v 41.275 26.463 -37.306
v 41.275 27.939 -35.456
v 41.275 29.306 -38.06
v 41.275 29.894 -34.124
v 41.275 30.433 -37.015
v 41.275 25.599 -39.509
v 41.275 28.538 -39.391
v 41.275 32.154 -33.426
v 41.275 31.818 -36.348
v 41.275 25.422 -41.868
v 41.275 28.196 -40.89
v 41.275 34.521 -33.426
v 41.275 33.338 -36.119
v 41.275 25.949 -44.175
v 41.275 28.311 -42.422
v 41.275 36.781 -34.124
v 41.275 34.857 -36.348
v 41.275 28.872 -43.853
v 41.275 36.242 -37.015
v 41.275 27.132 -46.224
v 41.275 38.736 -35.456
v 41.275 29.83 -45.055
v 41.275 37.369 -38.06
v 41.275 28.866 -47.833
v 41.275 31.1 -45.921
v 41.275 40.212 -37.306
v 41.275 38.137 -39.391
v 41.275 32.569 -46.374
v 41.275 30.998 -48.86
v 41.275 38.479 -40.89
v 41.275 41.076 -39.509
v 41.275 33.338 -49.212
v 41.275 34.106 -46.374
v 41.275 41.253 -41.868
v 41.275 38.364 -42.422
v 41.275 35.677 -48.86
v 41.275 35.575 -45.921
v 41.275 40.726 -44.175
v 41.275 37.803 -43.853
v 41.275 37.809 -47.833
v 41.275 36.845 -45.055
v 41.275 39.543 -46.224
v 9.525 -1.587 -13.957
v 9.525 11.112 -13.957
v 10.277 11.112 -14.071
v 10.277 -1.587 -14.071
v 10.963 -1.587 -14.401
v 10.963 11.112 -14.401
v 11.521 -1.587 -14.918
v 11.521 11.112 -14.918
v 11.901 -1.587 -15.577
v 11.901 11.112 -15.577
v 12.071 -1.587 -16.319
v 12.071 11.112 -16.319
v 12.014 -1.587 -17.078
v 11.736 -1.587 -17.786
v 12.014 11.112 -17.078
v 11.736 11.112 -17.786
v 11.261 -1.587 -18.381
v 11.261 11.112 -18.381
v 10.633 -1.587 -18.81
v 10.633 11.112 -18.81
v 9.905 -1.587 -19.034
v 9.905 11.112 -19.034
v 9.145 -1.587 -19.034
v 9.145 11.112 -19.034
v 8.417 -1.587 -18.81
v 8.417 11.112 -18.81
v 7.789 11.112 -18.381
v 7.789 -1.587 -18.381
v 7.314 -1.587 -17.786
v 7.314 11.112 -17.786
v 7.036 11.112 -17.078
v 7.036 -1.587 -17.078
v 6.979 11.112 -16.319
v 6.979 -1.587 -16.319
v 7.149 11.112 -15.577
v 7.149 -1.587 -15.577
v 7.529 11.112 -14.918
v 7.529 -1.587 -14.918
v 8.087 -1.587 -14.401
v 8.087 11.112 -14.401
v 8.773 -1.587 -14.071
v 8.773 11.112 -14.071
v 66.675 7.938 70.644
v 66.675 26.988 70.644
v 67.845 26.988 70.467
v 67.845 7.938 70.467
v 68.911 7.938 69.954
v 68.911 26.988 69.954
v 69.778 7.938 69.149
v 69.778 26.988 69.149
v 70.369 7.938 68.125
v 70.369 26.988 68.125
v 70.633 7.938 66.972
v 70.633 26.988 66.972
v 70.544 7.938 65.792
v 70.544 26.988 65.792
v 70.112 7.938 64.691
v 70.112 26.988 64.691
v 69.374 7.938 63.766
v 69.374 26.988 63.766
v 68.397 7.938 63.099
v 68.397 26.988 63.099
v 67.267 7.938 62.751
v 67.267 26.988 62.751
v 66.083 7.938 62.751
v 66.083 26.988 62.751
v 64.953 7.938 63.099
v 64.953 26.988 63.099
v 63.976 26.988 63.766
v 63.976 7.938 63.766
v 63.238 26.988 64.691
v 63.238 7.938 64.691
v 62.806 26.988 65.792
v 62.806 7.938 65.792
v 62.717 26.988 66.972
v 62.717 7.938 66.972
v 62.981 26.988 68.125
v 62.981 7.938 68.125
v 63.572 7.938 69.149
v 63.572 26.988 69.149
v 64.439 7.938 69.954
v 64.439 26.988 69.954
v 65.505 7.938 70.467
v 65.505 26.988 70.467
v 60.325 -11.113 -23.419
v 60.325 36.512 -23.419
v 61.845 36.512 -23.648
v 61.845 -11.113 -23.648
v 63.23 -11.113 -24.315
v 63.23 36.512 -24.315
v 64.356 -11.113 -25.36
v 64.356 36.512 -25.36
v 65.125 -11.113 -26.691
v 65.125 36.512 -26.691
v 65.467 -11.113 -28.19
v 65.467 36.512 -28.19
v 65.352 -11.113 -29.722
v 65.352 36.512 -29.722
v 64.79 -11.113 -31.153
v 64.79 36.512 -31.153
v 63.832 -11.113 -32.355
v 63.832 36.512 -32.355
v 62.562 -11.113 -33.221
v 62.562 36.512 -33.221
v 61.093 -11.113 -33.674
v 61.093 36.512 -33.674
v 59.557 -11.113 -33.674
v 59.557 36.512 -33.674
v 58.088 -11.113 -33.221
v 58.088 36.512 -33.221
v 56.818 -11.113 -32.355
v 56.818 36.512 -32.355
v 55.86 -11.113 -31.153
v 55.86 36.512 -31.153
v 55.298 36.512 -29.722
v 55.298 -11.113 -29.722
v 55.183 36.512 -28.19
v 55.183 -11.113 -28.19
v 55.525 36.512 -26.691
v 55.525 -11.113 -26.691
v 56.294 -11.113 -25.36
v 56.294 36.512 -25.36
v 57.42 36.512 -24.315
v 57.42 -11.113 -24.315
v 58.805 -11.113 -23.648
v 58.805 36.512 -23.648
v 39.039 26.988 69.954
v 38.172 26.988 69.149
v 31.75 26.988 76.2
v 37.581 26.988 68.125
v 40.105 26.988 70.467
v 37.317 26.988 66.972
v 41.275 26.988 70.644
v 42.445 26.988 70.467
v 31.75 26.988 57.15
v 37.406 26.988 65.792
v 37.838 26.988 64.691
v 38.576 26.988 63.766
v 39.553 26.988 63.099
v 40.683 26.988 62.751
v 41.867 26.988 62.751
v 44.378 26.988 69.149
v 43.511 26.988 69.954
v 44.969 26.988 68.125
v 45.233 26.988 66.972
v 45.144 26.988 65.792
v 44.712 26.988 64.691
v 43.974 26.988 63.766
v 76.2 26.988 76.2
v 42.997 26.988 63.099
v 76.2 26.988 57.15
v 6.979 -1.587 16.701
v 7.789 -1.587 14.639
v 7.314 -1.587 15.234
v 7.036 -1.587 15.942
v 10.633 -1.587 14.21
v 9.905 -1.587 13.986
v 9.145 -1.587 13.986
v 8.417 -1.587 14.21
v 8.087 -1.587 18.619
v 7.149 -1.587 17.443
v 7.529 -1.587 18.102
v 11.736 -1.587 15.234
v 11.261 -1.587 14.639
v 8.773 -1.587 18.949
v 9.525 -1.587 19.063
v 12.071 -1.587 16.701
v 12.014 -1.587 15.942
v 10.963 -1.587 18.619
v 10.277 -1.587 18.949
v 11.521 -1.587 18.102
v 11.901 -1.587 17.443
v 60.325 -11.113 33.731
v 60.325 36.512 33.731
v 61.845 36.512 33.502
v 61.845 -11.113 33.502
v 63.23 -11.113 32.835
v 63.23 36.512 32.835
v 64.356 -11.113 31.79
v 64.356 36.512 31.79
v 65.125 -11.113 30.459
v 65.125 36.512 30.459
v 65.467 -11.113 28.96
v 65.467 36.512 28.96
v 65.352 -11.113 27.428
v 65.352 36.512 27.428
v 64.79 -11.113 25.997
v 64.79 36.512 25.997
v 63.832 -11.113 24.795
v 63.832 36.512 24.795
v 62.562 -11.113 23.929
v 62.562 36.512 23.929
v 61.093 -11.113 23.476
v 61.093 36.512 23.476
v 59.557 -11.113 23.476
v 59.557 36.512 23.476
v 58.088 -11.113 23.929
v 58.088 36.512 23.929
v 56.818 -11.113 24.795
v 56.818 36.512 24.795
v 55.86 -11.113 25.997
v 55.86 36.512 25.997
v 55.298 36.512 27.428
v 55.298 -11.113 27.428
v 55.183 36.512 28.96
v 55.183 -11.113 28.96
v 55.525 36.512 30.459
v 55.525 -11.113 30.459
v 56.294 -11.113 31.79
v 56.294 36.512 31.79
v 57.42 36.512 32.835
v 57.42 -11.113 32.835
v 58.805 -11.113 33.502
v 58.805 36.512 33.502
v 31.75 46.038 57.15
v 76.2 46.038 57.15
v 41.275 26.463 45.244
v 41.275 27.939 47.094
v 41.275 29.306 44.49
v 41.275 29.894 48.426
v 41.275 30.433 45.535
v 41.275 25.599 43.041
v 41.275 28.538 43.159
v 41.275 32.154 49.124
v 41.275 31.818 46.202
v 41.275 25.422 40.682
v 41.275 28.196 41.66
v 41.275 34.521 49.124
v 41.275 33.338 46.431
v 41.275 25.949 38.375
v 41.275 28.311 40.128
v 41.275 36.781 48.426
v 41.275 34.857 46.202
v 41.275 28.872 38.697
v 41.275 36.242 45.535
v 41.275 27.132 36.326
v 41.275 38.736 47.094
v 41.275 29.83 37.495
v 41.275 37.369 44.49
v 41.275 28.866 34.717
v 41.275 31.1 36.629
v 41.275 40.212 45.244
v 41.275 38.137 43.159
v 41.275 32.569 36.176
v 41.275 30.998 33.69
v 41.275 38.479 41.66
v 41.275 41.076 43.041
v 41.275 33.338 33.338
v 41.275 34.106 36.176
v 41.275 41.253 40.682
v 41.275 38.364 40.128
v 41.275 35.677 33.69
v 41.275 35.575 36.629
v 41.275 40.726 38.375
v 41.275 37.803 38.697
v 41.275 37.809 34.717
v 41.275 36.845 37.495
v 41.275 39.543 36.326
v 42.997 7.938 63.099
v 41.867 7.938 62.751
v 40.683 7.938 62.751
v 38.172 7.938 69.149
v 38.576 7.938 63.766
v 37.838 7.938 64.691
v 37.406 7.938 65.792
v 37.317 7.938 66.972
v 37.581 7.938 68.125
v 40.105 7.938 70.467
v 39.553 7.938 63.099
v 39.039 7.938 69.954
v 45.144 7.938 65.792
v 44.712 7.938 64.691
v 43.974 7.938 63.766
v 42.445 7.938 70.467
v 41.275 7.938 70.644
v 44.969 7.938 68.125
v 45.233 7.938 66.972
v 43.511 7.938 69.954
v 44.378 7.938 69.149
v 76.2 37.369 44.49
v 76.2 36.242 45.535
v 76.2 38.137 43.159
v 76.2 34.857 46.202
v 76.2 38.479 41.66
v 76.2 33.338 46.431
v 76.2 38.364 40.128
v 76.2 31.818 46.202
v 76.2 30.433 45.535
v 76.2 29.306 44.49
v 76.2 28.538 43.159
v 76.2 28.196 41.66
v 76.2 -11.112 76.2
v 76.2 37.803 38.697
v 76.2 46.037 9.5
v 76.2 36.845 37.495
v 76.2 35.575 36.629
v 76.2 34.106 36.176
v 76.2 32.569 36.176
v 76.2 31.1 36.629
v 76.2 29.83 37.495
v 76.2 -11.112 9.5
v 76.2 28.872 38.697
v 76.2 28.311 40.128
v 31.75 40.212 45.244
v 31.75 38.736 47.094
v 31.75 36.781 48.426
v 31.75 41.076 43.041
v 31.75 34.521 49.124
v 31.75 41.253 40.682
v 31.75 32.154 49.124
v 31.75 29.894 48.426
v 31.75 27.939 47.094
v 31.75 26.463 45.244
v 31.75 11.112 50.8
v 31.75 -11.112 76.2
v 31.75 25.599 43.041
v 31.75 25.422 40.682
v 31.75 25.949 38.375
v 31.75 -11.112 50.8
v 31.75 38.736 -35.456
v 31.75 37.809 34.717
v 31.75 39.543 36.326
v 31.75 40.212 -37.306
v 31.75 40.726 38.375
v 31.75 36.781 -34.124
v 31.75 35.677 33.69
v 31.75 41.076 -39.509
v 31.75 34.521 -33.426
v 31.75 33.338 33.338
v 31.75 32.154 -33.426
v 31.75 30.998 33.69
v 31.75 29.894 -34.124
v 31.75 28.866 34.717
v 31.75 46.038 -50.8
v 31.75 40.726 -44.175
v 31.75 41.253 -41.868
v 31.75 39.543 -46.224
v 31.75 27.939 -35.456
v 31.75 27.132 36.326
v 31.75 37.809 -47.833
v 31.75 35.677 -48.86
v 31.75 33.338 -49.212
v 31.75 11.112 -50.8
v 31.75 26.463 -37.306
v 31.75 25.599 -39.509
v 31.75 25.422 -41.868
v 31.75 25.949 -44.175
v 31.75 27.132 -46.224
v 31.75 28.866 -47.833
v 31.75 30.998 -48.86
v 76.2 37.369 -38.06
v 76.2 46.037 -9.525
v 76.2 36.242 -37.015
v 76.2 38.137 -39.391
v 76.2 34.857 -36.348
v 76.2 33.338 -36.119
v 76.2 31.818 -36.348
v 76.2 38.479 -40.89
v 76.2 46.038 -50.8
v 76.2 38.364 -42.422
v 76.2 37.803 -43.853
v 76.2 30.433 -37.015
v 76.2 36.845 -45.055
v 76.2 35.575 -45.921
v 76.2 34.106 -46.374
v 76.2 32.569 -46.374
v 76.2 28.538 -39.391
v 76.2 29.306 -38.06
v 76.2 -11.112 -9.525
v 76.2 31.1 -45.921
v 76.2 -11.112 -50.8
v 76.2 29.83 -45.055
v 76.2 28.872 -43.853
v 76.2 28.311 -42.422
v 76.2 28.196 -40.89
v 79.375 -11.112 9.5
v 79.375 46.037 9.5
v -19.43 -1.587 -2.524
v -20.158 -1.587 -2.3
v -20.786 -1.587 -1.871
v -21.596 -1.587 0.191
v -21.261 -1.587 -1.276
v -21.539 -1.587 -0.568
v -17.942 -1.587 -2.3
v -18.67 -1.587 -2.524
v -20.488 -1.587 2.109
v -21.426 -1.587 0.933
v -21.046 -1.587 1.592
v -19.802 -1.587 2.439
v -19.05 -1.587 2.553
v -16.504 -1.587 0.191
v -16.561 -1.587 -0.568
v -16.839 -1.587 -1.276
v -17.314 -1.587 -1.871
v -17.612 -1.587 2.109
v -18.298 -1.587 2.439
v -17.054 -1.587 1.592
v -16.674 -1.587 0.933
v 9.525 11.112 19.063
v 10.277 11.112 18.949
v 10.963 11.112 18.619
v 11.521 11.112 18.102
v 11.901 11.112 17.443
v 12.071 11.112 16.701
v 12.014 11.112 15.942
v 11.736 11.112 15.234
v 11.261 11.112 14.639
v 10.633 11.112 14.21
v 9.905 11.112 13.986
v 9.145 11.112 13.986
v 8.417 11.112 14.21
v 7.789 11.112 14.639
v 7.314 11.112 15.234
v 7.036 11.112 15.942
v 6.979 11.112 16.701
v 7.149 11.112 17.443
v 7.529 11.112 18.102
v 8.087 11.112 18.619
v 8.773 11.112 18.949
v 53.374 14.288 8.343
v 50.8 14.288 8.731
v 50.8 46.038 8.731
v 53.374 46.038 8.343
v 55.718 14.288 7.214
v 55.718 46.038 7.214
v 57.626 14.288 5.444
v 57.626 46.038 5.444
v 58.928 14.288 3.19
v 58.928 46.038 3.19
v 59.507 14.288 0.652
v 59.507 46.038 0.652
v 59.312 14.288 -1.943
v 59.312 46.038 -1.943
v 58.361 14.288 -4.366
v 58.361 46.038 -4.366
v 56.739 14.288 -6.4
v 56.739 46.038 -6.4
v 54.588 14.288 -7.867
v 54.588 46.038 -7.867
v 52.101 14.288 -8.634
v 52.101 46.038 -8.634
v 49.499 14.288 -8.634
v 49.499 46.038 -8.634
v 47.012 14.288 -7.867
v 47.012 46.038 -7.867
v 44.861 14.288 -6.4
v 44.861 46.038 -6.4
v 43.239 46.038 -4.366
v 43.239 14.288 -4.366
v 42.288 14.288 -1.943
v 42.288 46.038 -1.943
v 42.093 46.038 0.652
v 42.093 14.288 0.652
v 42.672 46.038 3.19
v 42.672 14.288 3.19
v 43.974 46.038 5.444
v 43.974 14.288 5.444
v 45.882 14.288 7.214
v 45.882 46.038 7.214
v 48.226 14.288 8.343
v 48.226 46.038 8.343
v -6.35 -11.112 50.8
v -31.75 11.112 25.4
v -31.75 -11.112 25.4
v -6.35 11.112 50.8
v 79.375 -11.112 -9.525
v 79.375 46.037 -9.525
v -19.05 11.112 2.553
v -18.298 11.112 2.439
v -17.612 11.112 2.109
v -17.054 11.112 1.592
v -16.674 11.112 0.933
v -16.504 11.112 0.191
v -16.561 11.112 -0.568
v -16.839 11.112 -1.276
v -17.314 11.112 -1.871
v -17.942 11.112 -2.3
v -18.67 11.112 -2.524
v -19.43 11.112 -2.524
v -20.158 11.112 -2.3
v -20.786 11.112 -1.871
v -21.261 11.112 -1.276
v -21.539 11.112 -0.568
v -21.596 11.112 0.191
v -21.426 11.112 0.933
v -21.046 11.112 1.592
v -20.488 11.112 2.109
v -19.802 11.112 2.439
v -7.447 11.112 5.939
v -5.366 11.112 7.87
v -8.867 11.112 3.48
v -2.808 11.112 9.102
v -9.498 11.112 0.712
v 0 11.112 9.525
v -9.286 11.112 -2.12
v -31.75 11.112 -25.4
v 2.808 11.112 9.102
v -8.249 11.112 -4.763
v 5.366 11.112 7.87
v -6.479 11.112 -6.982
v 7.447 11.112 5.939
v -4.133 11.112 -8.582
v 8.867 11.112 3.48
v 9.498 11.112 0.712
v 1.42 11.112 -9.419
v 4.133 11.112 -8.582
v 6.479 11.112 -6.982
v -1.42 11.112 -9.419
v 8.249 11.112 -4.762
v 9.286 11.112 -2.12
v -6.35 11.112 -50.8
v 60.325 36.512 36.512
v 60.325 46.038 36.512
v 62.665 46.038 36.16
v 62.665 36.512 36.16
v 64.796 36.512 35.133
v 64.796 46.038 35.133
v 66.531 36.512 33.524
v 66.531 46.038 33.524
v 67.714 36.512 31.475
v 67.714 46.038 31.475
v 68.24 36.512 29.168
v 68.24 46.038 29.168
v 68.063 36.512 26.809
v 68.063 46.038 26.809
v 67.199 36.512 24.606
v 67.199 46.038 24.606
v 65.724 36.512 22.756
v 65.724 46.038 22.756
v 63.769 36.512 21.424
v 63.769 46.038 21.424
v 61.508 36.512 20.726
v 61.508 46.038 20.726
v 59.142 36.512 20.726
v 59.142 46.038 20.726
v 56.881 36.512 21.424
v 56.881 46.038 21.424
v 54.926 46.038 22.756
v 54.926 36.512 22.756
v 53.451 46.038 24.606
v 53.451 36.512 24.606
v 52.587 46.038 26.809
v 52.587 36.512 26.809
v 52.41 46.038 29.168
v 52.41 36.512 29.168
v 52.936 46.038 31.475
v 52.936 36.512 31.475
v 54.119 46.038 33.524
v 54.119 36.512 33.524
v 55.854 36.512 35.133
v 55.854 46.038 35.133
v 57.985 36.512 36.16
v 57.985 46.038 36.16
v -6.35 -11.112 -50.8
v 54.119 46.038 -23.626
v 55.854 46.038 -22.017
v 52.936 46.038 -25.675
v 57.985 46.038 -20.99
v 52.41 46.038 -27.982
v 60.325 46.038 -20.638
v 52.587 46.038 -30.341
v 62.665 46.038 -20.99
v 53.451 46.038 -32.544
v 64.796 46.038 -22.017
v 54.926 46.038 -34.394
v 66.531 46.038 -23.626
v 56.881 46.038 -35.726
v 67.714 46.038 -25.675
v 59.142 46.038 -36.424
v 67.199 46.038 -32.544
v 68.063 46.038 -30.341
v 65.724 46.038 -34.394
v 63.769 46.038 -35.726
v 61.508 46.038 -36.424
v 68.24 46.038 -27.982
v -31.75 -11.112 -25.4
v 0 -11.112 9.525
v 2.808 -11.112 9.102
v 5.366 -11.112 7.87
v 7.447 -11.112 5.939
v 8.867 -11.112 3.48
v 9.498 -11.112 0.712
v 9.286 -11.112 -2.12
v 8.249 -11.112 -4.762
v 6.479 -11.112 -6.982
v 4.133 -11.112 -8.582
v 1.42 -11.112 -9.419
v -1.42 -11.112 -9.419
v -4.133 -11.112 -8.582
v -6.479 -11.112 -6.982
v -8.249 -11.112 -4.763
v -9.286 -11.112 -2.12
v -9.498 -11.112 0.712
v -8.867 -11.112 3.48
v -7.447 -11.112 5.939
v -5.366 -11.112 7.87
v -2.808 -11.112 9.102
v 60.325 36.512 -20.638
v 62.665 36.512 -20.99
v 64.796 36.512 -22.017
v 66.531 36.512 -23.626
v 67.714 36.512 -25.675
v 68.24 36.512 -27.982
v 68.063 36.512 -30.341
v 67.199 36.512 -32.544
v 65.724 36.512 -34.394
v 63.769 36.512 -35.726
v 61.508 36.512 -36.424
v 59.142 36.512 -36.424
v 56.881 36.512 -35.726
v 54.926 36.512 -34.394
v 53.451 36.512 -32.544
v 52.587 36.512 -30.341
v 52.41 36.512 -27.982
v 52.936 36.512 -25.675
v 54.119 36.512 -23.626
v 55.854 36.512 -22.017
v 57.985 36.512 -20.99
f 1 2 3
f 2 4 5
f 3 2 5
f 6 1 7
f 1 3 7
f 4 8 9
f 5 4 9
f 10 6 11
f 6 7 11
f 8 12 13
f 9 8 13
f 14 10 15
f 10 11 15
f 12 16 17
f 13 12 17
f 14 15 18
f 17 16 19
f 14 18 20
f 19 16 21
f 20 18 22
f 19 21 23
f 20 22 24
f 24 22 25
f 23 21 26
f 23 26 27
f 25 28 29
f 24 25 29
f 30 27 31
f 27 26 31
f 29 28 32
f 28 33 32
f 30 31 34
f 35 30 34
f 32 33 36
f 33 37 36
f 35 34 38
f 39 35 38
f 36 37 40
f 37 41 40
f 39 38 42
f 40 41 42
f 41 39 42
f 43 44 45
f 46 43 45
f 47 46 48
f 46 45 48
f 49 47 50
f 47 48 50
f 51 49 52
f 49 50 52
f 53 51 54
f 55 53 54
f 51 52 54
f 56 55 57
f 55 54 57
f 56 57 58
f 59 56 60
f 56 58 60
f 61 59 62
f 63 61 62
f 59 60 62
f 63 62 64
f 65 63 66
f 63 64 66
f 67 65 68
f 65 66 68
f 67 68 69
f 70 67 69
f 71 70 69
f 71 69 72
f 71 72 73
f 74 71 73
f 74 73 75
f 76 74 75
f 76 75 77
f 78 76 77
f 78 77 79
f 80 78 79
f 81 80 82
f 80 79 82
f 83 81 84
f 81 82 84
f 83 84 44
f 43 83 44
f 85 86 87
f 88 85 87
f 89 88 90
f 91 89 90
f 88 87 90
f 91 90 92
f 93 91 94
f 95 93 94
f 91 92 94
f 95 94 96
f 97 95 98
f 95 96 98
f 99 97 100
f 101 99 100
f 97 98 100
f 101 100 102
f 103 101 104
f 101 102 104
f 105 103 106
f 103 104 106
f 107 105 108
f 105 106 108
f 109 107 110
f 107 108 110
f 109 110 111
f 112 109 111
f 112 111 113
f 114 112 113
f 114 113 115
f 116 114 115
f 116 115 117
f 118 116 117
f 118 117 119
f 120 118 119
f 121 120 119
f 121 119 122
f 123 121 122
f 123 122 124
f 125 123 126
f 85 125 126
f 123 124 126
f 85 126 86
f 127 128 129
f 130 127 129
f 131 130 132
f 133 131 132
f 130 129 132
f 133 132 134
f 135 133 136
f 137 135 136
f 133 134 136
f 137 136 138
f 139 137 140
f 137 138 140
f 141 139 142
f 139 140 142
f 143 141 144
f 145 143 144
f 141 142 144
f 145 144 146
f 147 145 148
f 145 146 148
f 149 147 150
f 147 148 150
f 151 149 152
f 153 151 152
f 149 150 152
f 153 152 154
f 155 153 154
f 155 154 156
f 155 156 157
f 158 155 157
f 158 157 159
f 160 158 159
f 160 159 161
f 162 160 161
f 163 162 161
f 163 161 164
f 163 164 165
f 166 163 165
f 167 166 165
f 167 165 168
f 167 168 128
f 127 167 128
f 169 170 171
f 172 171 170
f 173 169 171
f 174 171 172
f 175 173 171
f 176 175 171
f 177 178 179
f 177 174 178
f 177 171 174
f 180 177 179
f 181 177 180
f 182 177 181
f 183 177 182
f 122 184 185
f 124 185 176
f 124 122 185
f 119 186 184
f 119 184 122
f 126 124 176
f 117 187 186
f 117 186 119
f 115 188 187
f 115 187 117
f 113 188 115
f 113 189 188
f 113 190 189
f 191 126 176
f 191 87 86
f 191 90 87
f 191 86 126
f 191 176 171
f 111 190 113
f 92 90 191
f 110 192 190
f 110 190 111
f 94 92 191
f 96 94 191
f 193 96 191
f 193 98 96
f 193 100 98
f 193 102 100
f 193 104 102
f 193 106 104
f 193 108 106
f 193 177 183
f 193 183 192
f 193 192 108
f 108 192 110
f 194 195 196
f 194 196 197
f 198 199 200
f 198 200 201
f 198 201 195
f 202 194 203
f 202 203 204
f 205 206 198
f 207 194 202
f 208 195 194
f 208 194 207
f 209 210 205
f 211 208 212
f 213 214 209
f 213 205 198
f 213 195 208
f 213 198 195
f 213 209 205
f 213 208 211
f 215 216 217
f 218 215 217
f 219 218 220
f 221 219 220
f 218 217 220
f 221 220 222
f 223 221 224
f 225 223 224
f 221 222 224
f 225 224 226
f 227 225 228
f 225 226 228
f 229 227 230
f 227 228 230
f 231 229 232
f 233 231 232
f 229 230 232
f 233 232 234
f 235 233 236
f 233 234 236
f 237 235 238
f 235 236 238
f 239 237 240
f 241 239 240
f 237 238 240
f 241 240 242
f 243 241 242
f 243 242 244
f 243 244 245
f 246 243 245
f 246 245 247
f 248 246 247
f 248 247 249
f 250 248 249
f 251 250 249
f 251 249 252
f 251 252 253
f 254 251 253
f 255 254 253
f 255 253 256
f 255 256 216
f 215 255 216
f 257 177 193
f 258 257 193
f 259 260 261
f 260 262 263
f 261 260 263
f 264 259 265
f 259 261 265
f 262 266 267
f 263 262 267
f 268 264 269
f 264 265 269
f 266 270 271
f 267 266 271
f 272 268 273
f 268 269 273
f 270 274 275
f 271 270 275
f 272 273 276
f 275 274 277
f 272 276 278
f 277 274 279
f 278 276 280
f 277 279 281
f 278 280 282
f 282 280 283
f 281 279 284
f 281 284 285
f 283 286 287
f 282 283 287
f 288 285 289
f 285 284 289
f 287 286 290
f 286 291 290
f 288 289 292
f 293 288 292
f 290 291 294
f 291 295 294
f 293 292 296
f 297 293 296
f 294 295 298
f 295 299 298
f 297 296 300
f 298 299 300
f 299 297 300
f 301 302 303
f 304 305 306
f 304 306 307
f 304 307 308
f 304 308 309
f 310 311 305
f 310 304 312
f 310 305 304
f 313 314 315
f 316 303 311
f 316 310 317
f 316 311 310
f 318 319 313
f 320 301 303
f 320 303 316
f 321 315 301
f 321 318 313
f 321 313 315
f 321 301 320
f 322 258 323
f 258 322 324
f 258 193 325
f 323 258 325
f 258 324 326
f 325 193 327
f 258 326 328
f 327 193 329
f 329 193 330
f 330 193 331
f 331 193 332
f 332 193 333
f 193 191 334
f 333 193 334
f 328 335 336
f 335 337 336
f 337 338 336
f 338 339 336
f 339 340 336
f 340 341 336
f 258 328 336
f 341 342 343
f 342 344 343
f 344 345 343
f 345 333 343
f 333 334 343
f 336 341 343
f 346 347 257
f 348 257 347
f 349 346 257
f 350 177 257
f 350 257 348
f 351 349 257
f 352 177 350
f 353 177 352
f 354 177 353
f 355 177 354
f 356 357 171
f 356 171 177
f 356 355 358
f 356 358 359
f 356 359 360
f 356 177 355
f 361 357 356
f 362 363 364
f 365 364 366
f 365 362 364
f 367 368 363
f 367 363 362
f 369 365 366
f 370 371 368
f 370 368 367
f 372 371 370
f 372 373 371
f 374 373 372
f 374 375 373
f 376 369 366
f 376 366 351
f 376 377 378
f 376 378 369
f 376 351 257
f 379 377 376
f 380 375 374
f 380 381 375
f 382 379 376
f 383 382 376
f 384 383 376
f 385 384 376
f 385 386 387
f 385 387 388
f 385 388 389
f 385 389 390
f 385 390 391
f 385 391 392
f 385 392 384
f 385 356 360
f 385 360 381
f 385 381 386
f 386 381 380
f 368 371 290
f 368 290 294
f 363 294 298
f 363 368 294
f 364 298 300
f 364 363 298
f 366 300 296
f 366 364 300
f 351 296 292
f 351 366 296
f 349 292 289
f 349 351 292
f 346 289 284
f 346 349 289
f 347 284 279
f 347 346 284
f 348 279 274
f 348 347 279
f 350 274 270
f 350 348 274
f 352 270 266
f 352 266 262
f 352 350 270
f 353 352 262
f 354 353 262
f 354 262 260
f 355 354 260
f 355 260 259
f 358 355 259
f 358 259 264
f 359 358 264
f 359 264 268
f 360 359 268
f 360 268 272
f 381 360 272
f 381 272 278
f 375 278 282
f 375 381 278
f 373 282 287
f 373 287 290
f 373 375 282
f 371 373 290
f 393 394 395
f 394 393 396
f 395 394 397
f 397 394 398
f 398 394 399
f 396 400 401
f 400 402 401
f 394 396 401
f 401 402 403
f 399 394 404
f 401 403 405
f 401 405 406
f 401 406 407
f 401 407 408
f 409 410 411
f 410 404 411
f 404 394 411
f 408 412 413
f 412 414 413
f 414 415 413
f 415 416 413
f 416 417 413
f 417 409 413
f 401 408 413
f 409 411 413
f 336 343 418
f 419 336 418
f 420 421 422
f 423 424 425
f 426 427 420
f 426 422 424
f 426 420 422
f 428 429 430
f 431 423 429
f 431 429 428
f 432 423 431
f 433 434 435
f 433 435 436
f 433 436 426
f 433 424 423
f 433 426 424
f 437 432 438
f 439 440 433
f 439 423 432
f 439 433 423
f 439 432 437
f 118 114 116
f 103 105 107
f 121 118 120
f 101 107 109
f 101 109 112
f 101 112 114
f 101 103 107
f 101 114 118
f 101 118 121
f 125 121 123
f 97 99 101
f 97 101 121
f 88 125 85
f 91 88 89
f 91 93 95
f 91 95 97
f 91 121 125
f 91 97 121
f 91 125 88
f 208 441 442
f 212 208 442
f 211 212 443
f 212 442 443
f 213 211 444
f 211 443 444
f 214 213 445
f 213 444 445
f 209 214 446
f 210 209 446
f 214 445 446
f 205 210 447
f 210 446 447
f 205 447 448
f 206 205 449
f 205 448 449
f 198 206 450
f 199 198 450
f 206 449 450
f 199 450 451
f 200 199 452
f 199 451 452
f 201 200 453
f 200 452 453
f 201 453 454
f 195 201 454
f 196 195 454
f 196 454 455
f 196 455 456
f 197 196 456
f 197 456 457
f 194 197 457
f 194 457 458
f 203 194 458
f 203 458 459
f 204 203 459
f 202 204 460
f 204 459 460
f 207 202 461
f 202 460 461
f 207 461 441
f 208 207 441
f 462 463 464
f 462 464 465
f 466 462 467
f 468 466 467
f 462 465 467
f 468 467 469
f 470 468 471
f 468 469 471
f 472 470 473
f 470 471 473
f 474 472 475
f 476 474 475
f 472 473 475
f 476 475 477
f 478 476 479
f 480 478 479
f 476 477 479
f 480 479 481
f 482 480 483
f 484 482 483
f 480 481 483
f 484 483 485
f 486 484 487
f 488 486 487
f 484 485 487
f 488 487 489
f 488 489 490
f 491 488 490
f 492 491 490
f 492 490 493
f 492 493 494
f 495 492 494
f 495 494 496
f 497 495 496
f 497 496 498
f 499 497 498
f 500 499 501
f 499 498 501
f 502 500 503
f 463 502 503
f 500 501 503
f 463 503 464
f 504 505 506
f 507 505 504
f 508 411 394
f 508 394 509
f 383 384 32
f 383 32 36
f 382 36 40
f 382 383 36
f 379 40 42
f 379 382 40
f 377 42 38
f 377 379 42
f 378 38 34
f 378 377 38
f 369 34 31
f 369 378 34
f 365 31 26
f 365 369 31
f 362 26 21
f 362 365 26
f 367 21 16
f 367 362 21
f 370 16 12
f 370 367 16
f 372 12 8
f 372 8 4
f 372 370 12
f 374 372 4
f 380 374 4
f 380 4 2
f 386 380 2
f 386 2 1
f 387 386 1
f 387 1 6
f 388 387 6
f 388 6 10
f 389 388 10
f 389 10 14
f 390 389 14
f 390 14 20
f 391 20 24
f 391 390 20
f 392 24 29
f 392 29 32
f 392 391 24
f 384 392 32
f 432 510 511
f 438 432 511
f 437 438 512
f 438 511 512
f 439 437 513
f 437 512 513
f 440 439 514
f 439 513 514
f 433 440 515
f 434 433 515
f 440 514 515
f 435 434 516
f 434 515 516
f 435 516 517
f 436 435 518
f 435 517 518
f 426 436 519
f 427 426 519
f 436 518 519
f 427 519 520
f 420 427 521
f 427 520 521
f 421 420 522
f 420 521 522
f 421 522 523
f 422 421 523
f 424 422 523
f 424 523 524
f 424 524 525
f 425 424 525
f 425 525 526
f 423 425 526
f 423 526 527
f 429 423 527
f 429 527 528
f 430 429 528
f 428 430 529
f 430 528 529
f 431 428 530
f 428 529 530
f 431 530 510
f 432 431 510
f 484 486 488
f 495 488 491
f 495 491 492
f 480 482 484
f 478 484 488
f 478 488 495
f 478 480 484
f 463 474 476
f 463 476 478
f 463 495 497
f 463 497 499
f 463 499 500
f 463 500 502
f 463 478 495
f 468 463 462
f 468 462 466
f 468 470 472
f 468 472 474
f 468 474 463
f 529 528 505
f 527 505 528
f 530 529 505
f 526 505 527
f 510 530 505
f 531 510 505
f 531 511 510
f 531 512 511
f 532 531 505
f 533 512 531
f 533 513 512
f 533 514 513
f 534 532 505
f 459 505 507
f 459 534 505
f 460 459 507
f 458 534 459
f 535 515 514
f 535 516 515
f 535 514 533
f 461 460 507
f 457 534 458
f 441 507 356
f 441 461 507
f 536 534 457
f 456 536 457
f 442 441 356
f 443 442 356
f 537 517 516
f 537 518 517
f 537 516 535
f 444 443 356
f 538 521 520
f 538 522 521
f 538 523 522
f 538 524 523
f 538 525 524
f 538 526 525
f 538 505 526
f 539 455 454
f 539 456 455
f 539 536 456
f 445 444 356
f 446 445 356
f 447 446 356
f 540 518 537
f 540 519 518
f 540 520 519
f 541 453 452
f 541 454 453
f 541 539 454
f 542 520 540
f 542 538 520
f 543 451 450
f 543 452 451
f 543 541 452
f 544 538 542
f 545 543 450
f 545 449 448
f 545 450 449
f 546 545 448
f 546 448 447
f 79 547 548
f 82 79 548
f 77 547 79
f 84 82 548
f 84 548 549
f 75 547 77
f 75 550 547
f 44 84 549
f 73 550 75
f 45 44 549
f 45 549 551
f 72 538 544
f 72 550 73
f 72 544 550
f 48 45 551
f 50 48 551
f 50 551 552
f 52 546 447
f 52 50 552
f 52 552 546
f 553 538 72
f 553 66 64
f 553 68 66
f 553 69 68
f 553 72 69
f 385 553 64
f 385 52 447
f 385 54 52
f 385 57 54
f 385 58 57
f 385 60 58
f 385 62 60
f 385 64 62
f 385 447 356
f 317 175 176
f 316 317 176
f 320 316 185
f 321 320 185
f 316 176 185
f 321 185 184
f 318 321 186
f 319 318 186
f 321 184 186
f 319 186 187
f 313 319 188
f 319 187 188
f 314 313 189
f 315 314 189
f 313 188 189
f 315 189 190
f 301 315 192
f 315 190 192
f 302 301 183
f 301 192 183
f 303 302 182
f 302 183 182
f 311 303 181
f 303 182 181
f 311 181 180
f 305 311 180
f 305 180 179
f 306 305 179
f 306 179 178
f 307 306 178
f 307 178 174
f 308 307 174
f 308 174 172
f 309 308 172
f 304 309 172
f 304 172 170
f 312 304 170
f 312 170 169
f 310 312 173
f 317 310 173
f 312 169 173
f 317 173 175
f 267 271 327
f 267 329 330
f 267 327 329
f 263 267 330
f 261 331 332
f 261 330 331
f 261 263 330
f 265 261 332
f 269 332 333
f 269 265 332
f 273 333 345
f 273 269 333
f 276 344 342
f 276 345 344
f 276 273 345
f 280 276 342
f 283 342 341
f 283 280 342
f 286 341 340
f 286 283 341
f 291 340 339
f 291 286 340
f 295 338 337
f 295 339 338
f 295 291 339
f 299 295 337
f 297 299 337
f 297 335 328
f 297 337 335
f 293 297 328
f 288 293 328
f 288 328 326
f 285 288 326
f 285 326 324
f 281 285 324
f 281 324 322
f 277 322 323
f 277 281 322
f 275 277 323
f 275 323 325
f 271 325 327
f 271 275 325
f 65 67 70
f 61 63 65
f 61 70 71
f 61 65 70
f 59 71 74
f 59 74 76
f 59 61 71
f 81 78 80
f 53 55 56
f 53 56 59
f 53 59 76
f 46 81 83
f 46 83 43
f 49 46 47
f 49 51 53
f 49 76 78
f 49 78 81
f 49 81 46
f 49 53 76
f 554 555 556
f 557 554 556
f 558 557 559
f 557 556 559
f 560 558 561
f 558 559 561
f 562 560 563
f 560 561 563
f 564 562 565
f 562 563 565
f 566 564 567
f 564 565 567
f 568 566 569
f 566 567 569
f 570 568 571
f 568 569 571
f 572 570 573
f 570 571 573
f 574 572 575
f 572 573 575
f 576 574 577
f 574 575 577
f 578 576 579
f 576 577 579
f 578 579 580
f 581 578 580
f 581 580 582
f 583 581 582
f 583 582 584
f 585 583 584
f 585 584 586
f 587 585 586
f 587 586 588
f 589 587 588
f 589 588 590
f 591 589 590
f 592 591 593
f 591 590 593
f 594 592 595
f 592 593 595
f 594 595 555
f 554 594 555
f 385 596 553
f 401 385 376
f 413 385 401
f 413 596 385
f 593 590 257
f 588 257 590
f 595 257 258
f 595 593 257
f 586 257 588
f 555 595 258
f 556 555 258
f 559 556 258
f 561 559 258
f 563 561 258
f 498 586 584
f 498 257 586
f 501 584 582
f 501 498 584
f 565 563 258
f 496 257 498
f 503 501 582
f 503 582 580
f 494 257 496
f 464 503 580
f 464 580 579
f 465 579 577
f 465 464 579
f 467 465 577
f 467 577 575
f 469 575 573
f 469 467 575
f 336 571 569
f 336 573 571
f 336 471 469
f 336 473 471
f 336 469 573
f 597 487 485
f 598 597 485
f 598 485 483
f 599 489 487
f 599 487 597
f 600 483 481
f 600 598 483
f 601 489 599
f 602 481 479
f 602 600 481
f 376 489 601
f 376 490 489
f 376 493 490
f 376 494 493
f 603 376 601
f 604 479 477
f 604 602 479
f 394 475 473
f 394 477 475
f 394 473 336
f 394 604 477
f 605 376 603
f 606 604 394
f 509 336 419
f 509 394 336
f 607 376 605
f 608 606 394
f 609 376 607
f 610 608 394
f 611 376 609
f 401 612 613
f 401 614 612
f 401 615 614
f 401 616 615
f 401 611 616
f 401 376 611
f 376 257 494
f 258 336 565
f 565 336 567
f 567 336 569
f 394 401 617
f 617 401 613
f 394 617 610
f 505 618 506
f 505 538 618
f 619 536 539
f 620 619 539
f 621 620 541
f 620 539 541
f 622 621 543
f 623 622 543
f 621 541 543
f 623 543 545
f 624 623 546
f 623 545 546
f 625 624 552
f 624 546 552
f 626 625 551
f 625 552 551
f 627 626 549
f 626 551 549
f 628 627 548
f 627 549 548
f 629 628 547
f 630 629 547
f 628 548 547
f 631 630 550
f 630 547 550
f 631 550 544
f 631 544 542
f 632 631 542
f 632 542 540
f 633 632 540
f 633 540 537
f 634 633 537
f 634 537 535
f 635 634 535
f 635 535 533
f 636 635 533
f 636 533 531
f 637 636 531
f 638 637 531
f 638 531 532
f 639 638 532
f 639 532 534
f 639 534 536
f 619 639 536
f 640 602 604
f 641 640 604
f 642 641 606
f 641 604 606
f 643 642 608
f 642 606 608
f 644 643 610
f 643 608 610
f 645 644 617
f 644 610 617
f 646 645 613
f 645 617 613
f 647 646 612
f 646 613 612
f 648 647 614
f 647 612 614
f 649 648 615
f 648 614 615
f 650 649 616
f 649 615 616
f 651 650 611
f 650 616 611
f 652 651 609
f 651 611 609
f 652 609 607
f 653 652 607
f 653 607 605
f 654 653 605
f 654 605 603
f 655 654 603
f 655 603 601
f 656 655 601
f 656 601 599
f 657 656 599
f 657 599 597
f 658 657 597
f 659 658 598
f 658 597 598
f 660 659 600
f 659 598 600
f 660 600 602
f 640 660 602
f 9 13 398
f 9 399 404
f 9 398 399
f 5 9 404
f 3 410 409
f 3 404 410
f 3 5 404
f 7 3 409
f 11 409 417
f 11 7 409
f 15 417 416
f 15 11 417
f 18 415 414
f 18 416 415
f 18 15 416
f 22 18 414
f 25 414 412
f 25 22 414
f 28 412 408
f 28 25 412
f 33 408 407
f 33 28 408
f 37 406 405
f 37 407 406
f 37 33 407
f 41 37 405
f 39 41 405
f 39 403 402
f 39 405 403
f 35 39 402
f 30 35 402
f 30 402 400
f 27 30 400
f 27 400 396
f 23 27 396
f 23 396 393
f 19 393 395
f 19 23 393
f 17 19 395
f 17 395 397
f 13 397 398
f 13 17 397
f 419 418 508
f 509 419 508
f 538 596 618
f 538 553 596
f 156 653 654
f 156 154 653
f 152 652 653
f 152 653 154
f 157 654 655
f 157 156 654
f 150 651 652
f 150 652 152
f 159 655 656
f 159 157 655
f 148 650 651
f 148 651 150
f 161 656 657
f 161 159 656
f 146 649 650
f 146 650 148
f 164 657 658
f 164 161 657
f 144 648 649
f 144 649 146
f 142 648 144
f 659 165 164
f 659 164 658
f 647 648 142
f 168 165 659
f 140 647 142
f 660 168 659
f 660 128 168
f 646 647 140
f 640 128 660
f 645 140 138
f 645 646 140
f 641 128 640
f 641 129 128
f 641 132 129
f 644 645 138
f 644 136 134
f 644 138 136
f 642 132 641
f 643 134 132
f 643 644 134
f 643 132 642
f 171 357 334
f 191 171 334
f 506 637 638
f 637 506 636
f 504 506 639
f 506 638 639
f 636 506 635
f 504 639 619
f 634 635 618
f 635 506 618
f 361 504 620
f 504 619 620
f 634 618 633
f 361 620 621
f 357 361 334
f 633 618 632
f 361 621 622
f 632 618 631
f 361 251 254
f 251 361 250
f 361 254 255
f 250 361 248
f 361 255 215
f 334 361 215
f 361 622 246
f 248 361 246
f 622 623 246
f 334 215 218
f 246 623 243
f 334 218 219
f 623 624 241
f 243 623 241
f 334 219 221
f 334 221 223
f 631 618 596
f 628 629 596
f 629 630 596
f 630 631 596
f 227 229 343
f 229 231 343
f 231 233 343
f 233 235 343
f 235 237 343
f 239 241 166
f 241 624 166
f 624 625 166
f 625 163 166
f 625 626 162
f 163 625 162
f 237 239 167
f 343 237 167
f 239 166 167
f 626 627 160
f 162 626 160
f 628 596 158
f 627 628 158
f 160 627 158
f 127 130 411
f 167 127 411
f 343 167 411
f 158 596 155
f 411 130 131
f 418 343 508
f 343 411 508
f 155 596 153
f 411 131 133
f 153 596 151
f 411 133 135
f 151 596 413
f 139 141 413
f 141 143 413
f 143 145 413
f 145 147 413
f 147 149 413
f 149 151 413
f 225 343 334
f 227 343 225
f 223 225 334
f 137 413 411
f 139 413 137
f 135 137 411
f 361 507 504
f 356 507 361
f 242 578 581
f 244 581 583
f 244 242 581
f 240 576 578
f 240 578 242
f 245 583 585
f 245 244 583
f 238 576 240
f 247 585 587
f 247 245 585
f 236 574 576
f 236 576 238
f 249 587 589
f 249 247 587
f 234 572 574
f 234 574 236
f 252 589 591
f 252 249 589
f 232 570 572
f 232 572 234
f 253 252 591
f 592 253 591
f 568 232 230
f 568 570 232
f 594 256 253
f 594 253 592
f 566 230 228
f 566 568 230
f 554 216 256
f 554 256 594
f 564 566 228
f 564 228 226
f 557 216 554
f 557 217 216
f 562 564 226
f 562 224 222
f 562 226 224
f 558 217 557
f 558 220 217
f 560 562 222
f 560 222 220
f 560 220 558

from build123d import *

# Parameters (mm, degrees)
BOSS_EXTRUDE1_DEPTH = 11.1125
BOSS_EXTRUDE2_START = -11.1125
SKETCH2_W           = 44.45
SKETCH2_H           = 127
BOSS_EXTRUDE2_DEPTH = 38.1
BOSS_EXTRUDE3_START = 26.9875
SKETCH3_W           = 44.45
SKETCH3_H           = 107.95
BOSS_EXTRUDE3_DEPTH = 19.05
BOSS_EXTRUDE4_START = -11.1125
SKETCH4_W           = 3.175
SKETCH4_H           = 19.0246
BOSS_EXTRUDE4_DEPTH = 57.15
CUT_EXTRUDE2_START  = 11.1125
SKETCH5_R           = 9.525
CUT_EXTRUDE2_DEPTH  = 131.386478852
CUT_EXTRUDE4_START  = 11.1125
SKETCH6_R           = 2.5527
CUT_EXTRUDE4_DEPTH  = 12.7
CUT_EXTRUDE6_START  = 11.1125
SKETCH7_R           = 2.5527
CUT_EXTRUDE6_DEPTH  = 12.7
CUT_EXTRUDE8_START  = 46.0375
SKETCH8_R           = 8.73125
CUT_EXTRUDE8_DEPTH  = 31.75
CUT_EXTRUDE10_START = 26.9875
SKETCH9_R           = 3.96875
CUT_EXTRUDE10_DEPTH = 19.05
CUT_EXTRUDE12_START = 46.0375
SKETCH10_R          = 5.1562
CUT_EXTRUDE12_DEPTH = 166.311478852
CUT_EXTRUDE14_START = 46.0375
SKETCH11_R          = 7.9375
CUT_EXTRUDE14_DEPTH = 9.525
CUT_EXTRUDE16_START = 31.75
SKETCH12_R          = 5.1562
CUT_EXTRUDE16_DEPTH = 88.523978852
CUT_EXTRUDE18_START = 31.75
SKETCH13_R          = 7.9375
CUT_EXTRUDE18_DEPTH = 9.525


with BuildPart() as part:
    # Sketch1 → Boss-Extrude1 (new, symmetric)
    with BuildSketch(Plane(origin=(0, 0, 0), x_dir=(1, 0, 0), z_dir=(0, 1, 0))):
        Polygon((-31.75, -25.4), (-6.35, -50.8), (31.75, -50.8), (31.75, 50.8), (-6.35, 50.8), (-31.75, 25.4), align=None)
    extrude(amount=BOSS_EXTRUDE1_DEPTH, both=True)

    # Sketch2 → Boss-Extrude2 (add)
    with BuildSketch(Plane(origin=(0, 0, 0), x_dir=(1, 0, 0), z_dir=(0, 1, 0)).offset(BOSS_EXTRUDE2_START)):
        with Locations((53.975, -12.7)):
            Rectangle(SKETCH2_W, SKETCH2_H)
    extrude(amount=BOSS_EXTRUDE2_DEPTH)

    # Sketch3 → Boss-Extrude3 (add)
    with BuildSketch(Plane(origin=(0, 0, 0), x_dir=(1, 0, 0), z_dir=(0, 1, 0)).offset(BOSS_EXTRUDE3_START)):
        with Locations((53.975, -3.175)):
            Rectangle(SKETCH3_W, SKETCH3_H)
    extrude(amount=BOSS_EXTRUDE3_DEPTH)

    # Sketch4 → Boss-Extrude4 (add)
    with BuildSketch(Plane(origin=(0, 0, 0), x_dir=(1, 0, 0), z_dir=(0, 1, 0)).offset(BOSS_EXTRUDE4_START)):
        with Locations((77.7875, 0.0127)):
            Rectangle(SKETCH4_W, SKETCH4_H)
    extrude(amount=BOSS_EXTRUDE4_DEPTH)

    # Sketch5 → Cut-Extrude2 (cut, through all)
    with BuildSketch(Plane(origin=(0, 0, 0), x_dir=(1, 0, 0), z_dir=(0, 1, 0)).offset(CUT_EXTRUDE2_START)):
        with Locations(Location((0, 0, 0), (0, 0, 270))):
            Circle(SKETCH5_R)
    extrude(amount=-CUT_EXTRUDE2_DEPTH, mode=Mode.SUBTRACT)

    # Sketch6 → Cut-Extrude4 (cut)
    with BuildSketch(Plane(origin=(0, 0, 0), x_dir=(1, 0, 0), z_dir=(0, 1, 0)).offset(CUT_EXTRUDE4_START)):
        with Locations(Location((-19.05, 0, 0), (0, 0, 270))):
            Circle(SKETCH6_R)
        with Locations(Location((9.525, -16.51, 0), (0, 0, 270))):
            Circle(SKETCH6_R)
    extrude(amount=-CUT_EXTRUDE4_DEPTH, mode=Mode.SUBTRACT)

    # Sketch7 → Cut-Extrude6 (cut)
    with BuildSketch(Plane(origin=(0, 0, 0), x_dir=(1, 0, 0), z_dir=(0, 1, 0)).offset(CUT_EXTRUDE6_START)):
        with Locations(Location((9.525, 16.51, 0), (0, 0, 270))):
            Circle(SKETCH7_R)
    extrude(amount=-CUT_EXTRUDE6_DEPTH, mode=Mode.SUBTRACT)

    # Sketch8 → Cut-Extrude8 (cut)
    with BuildSketch(Plane(origin=(0, 0, 0), x_dir=(1, 0, 0), z_dir=(0, 1, 0)).offset(CUT_EXTRUDE8_START)):
        with Locations(Location((50.8, 0, 0), (0, 0, 270))):
            Circle(SKETCH8_R)
    extrude(amount=-CUT_EXTRUDE8_DEPTH, mode=Mode.SUBTRACT)

    # Sketch9 → Cut-Extrude10 (cut)
    with BuildSketch(Plane(origin=(0, 0, 0), x_dir=(1, 0, 0), z_dir=(0, 1, 0)).offset(CUT_EXTRUDE10_START)):
        with Locations(Location((41.275, -66.675, 0), (0, 0, 270))):
            Circle(SKETCH9_R)
        with Locations(Location((66.675, -66.675, 0), (0, 0, 270))):
            Circle(SKETCH9_R)
    extrude(amount=-CUT_EXTRUDE10_DEPTH, mode=Mode.SUBTRACT)

    # Sketch10 → Cut-Extrude12 (cut, through all)
    with BuildSketch(Plane(origin=(0, 0, 0), x_dir=(1, 0, 0), z_dir=(0, 1, 0)).offset(CUT_EXTRUDE12_START)):
        with Locations(Location((60.325, -28.575, 0), (0, 0, 270))):
            Circle(SKETCH10_R)
        with Locations(Location((60.325, 28.575, 0), (0, 0, 270))):
            Circle(SKETCH10_R)
    extrude(amount=-CUT_EXTRUDE12_DEPTH, mode=Mode.SUBTRACT)

    # Sketch11 → Cut-Extrude14 (cut)
    with BuildSketch(Plane(origin=(0, 0, 0), x_dir=(1, 0, 0), z_dir=(0, 1, 0)).offset(CUT_EXTRUDE14_START)):
        with Locations(Location((60.325, -28.575, 0), (0, 0, 270))):
            Circle(SKETCH11_R)
        with Locations(Location((60.325, 28.575, 0), (0, 0, 270))):
            Circle(SKETCH11_R)
    extrude(amount=-CUT_EXTRUDE14_DEPTH, mode=Mode.SUBTRACT)

    # Sketch12 → Cut-Extrude16 (cut, through all)
    with BuildSketch(Plane(origin=(0, 0, 0), x_dir=(0, 0, -1), z_dir=(1, 0, 0)).offset(CUT_EXTRUDE16_START)):
        with Locations(Location((-41.275, 33.3375, 0), (0, 0, 180))):
            Circle(SKETCH12_R)
        with Locations(Location((41.275, 33.3375, 0), (0, 0, 180))):
            Circle(SKETCH12_R)
    extrude(amount=CUT_EXTRUDE16_DEPTH, mode=Mode.SUBTRACT)

    # Sketch13 → Cut-Extrude18 (cut)
    with BuildSketch(Plane(origin=(0, 0, 0), x_dir=(0, 0, -1), z_dir=(1, 0, 0)).offset(CUT_EXTRUDE18_START)):
        with Locations((-41.275, 33.3375)):
            Circle(SKETCH13_R)
        with Locations((41.275, 33.3375)):
            Circle(SKETCH13_R)
    extrude(amount=CUT_EXTRUDE18_DEPTH, mode=Mode.SUBTRACT)


solid = part.part
